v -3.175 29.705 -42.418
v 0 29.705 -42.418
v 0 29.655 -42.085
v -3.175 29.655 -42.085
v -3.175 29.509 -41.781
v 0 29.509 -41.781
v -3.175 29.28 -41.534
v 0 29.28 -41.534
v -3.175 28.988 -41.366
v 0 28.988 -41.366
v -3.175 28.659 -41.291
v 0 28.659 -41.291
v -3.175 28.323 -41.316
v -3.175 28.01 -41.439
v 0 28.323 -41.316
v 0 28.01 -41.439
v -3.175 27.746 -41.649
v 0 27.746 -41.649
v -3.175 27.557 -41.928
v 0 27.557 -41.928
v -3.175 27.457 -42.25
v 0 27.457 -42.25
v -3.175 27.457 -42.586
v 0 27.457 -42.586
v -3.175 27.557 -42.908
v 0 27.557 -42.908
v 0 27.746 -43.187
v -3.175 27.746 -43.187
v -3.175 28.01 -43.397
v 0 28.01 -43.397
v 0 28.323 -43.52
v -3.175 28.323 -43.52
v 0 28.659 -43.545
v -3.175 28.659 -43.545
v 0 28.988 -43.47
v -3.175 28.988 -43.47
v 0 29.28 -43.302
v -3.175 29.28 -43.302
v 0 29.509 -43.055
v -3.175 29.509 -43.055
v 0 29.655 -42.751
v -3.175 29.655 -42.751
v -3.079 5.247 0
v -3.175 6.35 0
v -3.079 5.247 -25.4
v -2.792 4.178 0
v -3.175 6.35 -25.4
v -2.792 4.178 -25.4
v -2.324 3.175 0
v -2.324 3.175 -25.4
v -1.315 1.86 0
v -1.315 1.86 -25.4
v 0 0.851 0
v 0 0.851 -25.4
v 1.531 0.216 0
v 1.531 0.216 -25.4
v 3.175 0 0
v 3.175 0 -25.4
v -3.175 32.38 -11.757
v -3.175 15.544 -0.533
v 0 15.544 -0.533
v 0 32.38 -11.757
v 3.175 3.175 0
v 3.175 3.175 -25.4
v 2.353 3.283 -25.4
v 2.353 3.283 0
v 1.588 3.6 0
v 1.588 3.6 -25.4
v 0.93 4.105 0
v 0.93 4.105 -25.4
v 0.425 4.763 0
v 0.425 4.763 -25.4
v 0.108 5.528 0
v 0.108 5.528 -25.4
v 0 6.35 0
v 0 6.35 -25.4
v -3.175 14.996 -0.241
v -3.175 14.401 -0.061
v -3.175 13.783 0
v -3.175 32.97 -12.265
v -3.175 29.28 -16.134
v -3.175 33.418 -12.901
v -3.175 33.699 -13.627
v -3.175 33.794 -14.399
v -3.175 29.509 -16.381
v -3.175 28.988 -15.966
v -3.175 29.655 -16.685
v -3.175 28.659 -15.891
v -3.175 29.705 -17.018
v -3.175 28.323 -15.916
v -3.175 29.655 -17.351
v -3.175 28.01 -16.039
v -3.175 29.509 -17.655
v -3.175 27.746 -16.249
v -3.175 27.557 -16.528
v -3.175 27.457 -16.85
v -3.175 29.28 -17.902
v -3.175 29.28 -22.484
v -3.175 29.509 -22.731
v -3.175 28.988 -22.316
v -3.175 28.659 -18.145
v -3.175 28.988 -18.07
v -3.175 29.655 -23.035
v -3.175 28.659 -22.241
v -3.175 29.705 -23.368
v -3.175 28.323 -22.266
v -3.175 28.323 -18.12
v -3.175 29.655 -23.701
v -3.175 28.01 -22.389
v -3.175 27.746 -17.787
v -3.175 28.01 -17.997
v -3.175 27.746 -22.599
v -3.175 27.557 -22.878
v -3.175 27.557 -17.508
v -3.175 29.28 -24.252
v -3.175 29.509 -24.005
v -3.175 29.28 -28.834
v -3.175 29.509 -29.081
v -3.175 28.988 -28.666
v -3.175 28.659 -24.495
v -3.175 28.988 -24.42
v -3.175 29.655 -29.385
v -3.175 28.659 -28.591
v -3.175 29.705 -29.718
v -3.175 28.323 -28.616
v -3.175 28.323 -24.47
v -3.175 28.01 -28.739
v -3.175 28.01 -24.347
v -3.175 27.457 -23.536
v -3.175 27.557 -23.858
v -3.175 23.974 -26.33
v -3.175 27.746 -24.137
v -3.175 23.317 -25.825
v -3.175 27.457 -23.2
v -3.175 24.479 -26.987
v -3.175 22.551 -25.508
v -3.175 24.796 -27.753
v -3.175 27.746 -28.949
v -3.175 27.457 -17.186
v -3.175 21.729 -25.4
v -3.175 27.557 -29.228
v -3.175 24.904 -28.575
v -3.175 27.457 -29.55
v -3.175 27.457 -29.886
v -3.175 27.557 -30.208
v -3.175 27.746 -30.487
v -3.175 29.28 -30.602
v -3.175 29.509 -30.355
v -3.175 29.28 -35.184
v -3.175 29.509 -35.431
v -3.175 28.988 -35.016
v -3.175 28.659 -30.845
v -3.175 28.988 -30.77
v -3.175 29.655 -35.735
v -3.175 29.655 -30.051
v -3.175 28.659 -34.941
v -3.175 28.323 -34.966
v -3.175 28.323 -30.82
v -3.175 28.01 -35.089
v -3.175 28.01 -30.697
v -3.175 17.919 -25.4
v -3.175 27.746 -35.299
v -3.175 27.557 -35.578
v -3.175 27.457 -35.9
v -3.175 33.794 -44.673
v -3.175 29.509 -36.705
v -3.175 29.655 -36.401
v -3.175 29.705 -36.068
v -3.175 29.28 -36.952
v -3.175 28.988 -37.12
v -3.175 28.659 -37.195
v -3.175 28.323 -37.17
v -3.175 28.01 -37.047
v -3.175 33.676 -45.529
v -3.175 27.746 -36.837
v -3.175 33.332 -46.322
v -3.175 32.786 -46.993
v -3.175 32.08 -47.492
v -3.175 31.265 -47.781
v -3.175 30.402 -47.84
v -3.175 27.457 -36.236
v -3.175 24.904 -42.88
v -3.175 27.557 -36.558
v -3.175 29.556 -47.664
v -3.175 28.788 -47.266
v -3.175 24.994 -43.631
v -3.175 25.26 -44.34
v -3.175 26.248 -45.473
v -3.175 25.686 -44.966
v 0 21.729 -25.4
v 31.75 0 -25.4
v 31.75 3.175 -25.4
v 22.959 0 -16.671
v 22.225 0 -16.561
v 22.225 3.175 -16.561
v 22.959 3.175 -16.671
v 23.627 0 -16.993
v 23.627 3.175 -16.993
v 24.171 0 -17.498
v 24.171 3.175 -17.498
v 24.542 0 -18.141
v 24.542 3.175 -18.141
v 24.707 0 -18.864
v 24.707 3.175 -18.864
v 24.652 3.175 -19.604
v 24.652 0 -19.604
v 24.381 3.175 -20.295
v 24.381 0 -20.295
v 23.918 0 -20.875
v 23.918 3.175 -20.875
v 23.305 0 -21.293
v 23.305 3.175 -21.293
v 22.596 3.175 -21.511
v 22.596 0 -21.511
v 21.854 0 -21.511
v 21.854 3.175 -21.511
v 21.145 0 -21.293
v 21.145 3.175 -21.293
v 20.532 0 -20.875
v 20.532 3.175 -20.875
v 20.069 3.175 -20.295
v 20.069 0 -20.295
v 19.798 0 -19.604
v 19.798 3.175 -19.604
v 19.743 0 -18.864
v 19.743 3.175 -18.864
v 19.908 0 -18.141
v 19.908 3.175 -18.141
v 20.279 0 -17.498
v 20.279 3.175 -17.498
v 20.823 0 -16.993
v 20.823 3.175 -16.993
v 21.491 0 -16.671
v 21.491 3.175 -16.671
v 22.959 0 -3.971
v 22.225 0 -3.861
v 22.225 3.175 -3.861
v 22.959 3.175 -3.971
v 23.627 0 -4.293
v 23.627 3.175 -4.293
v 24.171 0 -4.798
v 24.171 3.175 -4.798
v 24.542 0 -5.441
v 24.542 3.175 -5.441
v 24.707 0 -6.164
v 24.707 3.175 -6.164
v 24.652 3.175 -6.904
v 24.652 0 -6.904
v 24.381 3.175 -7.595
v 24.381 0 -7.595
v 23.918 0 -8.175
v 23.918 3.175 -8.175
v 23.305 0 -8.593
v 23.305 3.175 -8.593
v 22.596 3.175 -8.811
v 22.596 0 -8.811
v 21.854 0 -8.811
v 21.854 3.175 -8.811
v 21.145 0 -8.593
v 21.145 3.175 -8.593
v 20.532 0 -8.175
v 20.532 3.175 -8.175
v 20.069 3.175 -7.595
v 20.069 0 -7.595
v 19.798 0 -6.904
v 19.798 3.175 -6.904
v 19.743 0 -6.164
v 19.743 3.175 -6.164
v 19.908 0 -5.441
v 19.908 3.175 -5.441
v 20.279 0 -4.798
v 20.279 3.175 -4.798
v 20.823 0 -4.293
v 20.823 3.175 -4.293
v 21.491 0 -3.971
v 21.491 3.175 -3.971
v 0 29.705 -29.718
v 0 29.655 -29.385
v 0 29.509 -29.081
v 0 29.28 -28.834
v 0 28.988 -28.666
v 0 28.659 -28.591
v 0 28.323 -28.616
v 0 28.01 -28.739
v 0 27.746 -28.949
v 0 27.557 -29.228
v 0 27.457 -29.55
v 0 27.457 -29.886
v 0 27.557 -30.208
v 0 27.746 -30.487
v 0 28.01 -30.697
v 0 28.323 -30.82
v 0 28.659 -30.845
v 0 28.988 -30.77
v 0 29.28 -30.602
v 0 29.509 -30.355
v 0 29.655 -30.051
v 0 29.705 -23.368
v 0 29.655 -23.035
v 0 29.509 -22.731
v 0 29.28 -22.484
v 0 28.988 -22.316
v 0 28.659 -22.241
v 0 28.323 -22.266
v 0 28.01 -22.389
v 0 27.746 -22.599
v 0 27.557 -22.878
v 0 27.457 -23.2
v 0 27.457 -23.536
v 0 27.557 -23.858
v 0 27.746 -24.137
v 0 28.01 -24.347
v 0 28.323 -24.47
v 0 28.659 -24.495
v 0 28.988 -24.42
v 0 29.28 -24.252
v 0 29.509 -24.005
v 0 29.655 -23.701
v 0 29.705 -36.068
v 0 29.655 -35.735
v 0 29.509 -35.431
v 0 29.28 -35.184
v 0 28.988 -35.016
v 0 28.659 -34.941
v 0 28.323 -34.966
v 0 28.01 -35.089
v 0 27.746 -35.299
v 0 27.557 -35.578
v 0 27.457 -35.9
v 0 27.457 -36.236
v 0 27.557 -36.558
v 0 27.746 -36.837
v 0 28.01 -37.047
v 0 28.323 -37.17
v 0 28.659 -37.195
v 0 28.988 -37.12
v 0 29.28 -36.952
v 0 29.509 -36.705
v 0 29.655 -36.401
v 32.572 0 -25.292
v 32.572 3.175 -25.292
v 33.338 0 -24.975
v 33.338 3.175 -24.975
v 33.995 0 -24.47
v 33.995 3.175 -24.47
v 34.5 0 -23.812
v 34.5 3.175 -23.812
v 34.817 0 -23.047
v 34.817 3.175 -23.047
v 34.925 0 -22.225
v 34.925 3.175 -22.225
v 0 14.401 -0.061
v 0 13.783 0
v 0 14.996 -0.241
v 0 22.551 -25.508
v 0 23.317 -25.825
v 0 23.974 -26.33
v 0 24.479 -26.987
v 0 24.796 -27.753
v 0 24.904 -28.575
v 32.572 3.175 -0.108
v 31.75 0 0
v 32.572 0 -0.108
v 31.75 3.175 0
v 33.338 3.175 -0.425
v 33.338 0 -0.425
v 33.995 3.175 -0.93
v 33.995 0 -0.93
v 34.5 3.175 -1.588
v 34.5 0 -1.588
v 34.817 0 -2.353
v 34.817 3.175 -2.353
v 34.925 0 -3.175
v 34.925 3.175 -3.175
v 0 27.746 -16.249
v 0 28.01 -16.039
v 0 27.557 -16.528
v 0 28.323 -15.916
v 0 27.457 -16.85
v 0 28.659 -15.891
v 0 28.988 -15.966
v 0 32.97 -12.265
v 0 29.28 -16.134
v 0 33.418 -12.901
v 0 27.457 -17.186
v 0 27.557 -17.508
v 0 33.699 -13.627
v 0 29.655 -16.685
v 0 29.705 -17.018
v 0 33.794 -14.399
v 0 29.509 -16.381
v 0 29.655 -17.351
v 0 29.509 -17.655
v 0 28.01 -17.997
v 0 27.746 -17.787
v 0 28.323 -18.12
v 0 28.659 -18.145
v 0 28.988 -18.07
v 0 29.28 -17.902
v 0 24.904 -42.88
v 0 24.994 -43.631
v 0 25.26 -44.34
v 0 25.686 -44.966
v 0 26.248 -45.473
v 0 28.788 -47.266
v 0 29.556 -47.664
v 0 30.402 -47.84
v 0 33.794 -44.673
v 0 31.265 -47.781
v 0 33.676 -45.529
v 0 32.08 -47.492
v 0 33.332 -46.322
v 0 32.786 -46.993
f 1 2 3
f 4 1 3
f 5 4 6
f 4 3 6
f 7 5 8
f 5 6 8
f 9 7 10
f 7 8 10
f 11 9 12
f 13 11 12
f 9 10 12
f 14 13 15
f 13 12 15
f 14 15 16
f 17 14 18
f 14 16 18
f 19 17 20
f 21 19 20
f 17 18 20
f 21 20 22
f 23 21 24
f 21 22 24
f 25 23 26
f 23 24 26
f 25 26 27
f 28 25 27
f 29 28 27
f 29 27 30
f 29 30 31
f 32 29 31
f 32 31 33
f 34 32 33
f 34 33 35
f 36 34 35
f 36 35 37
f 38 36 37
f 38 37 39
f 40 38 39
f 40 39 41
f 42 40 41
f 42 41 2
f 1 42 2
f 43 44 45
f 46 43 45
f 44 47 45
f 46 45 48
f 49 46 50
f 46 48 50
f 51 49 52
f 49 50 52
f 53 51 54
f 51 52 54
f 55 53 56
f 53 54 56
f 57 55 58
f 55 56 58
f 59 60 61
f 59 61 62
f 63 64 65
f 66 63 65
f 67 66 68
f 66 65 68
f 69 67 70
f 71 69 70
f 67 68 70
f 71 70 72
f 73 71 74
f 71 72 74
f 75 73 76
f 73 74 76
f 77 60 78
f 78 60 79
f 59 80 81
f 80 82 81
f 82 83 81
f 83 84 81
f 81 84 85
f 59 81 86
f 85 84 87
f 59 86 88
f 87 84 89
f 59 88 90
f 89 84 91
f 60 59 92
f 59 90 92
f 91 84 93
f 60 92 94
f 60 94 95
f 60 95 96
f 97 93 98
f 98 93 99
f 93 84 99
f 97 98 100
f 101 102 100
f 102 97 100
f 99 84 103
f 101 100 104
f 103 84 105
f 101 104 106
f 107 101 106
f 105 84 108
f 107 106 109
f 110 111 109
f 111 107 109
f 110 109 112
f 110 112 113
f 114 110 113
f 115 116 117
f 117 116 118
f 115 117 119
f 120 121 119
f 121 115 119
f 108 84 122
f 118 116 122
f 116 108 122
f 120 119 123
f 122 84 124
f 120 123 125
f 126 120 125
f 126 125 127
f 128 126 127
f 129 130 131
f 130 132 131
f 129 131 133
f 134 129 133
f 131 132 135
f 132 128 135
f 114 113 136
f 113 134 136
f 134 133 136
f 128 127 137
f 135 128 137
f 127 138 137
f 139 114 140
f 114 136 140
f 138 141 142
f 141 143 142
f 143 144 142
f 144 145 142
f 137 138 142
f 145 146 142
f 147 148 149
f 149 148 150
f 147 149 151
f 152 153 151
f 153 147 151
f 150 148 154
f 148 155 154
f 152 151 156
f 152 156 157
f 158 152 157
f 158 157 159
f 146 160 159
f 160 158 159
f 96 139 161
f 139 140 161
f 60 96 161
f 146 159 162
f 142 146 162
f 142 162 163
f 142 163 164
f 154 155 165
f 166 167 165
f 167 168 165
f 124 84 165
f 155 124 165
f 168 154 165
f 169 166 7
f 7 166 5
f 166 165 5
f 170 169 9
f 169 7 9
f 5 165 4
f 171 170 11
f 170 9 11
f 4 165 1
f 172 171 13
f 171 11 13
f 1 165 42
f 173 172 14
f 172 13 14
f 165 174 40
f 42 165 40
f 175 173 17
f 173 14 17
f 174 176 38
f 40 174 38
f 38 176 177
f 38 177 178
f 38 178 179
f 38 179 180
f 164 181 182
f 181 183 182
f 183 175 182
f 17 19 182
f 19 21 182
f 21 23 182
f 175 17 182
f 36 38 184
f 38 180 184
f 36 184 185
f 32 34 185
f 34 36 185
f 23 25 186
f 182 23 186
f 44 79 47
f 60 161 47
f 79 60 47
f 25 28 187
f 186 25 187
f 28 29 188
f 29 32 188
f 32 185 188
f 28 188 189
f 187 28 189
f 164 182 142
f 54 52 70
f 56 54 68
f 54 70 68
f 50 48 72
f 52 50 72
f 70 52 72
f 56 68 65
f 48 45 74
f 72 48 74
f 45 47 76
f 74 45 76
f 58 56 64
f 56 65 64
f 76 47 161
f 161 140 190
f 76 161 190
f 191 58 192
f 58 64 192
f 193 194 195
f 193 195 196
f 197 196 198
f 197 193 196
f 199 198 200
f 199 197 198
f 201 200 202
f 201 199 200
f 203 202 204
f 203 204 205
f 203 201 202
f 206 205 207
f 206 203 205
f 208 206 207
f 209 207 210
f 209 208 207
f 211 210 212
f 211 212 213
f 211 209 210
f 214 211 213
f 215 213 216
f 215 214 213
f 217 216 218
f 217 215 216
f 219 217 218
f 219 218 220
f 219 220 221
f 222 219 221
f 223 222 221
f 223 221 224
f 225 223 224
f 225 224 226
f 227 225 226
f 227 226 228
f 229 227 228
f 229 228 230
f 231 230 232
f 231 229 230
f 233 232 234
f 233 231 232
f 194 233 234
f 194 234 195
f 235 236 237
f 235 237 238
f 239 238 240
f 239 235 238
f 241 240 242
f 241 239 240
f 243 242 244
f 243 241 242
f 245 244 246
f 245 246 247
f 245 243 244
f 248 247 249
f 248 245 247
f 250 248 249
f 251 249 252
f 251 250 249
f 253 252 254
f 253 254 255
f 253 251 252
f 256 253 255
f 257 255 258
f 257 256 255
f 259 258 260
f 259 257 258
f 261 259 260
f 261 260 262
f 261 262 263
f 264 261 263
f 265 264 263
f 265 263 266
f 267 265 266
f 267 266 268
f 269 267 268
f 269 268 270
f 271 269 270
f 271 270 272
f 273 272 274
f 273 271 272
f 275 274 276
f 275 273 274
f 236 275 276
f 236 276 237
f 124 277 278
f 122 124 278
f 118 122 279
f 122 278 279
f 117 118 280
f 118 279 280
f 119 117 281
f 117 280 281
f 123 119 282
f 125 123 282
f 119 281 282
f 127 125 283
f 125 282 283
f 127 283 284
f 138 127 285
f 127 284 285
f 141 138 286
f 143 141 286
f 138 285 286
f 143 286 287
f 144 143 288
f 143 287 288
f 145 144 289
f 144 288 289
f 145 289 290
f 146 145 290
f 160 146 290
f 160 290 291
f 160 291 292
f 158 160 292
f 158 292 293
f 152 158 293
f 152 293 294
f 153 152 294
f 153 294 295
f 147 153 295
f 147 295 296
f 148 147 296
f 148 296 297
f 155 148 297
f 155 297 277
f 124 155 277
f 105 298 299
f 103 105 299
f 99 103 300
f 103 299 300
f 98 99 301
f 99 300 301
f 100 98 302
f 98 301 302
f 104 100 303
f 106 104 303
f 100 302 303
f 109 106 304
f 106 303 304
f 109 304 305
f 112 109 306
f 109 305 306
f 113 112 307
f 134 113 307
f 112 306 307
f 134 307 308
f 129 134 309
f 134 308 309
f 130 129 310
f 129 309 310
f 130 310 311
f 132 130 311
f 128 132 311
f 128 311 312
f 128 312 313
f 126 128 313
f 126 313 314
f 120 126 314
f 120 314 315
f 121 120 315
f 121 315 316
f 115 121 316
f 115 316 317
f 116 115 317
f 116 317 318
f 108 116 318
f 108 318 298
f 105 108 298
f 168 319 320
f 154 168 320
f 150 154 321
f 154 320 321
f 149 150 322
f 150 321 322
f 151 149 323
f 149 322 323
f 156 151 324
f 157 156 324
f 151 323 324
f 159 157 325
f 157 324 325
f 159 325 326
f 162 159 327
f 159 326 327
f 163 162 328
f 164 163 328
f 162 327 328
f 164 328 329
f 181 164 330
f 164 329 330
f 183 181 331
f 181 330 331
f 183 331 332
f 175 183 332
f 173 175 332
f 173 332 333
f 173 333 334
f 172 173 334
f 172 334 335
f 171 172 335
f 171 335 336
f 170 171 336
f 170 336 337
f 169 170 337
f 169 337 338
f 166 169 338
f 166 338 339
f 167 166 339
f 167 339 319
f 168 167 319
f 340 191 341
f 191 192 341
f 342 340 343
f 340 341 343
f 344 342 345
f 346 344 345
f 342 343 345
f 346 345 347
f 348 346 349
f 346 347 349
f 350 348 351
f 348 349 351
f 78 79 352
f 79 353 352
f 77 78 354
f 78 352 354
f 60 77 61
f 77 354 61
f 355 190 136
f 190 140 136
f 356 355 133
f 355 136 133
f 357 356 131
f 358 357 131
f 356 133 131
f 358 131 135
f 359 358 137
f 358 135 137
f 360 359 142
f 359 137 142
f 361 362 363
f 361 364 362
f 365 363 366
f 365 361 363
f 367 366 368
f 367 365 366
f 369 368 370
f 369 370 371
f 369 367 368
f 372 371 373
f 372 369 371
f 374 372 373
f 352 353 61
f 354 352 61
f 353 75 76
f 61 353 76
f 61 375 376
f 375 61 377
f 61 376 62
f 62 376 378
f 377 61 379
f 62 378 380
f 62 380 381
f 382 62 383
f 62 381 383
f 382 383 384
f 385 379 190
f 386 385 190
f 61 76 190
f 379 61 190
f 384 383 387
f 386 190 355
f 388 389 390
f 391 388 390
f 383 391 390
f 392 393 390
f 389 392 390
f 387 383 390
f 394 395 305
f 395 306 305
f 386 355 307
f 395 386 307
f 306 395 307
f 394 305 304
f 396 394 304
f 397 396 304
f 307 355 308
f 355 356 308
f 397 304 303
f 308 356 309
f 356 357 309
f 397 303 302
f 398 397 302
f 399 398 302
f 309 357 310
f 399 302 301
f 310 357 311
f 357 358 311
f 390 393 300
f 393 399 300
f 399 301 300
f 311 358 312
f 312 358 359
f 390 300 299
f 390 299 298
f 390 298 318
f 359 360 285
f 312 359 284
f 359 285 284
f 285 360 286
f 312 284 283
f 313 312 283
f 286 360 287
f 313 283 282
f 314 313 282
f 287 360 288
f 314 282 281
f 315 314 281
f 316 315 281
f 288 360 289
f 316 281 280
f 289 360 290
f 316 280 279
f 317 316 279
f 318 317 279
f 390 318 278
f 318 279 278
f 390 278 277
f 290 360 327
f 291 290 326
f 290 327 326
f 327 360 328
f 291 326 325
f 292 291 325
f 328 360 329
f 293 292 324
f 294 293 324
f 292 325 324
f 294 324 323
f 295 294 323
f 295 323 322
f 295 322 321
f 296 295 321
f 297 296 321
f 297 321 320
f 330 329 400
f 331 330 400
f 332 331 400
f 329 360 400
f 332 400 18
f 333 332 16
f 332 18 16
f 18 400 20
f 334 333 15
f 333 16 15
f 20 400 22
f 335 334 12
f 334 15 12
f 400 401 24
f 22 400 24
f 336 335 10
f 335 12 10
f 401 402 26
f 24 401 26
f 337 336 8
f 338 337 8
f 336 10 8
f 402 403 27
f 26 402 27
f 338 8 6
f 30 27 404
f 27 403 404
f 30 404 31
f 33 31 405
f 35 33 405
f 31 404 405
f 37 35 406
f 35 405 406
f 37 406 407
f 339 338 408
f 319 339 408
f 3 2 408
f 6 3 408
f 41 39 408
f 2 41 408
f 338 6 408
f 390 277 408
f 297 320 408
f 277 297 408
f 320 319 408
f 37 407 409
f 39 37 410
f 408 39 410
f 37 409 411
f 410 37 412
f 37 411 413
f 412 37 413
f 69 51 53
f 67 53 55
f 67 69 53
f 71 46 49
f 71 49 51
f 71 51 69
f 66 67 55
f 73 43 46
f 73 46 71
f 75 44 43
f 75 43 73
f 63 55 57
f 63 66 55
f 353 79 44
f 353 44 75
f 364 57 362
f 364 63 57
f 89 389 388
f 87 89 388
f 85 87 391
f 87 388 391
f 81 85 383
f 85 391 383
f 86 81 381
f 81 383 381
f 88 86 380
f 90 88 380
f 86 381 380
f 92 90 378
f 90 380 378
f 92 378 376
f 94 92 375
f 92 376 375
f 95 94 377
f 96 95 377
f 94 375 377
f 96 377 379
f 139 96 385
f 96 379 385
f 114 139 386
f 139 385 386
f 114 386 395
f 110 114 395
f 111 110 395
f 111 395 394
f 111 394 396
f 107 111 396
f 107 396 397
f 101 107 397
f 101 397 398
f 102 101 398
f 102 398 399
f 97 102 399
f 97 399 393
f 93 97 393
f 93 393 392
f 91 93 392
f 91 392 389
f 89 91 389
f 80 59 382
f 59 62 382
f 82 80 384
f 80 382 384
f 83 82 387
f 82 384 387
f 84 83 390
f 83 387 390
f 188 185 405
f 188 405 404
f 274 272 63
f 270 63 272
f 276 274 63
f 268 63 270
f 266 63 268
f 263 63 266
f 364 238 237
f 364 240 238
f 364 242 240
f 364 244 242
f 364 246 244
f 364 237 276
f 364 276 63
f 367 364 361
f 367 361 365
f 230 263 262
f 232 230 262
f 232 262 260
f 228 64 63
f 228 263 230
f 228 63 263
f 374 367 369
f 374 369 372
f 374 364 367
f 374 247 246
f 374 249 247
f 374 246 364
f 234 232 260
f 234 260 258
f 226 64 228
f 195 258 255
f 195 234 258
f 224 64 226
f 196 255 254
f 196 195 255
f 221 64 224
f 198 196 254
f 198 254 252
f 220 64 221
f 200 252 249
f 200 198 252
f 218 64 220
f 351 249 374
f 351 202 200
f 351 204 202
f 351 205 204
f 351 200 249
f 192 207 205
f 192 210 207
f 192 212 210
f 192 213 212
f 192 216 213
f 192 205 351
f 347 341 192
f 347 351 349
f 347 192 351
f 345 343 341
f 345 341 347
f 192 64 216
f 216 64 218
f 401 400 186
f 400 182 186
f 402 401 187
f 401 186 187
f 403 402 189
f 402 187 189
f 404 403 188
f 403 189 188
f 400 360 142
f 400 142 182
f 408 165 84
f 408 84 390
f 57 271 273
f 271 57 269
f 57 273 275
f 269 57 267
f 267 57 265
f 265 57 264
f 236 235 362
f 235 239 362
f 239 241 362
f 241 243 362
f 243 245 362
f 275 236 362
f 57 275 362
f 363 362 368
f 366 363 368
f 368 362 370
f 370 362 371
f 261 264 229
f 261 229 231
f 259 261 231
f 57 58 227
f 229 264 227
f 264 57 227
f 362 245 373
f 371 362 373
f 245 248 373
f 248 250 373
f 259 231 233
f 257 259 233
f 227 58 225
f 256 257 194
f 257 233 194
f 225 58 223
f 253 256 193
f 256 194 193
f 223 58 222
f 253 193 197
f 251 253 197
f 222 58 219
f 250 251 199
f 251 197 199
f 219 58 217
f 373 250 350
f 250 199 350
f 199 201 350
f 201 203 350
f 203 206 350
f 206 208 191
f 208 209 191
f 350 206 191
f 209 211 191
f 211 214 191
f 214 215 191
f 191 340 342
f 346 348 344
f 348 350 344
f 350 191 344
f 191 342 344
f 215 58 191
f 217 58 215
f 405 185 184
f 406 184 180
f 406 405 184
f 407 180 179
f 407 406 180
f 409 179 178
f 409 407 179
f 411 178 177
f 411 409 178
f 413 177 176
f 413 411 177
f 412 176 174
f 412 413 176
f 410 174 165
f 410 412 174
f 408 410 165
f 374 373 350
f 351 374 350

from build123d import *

# Parameters (mm, degrees)
SKETCH1_R                  = 2.4892
BOSS_EXTRUDE1_DEPTH        = 3.175
SKETCHED_START             = -52
SKETCHED_BEND2_DEPTH       = 52
SKETCHED_START_2           = -25.4
SKETCHED_BEND2_2_DEPTH     = 12.7
SKETCHED_START_3           = -41.835294118
SKETCHED_BEND2_3_OUTLINE_W = 3.175
SKETCHED_BEND2_3_OUTLINE_H = 12.7
SKETCHED_BEND2_3_DEPTH     = 16.435294118
SKETCHED_BEND2_4_DEPTH     = 20.459192
SKETCHED_START_4           = -50.8
SKETCHED_BEND2_5_OUTLINE_W = 3.175
SKETCHED_BEND2_5_OUTLINE_H = 12.7
SKETCHED_BEND2_5_DEPTH     = 48.117252
SKETCHED_START_5           = -4.940808
SKETCHED_BEND2_6_DEPTH     = 4.940808
SKETCHED_START_6           = -3.175
SKETCHED_BEND2_7_DEPTH     = 3.175
SKETCH13_R                 = 1.1303
CUT_EXTRUDE2_DEPTH         = 71.302458254
FILLET1_R                  = 3.175
SKETCH14_W                 = 22.407113123
SKETCH14_H                 = 6.985
CUT_EXTRUDE3_DEPTH         = 69.199553227
FILLET2_R                  = 3.175


with BuildPart() as part:
    # Sketch1 → Boss-Extrude1 (new body)
    # profile 1 of 2: a face of its own
    with BuildSketch(Plane(origin=(0, 0, 0), x_dir=(1, 0, 0), z_dir=(0, 1, 0))):
        Polygon((6.35, 0), (25.4, 0), (34.925, 0), (34.925, 25.4), (26.986065751, 25.4), (10.476065751, 25.4), (6.35, 25.4), align=None)
        with Locations(Location((22.225, 6.35, 0), (0, 0, 270))):
            Circle(SKETCH1_R, mode=Mode.SUBTRACT)
        with Locations(Location((22.225, 19.05, 0), (0, 0, 270))):
            Circle(SKETCH1_R, mode=Mode.SUBTRACT)
    # profile 2 of 2: a face of its own
    with BuildSketch(Plane(origin=(0, 0, 0), x_dir=(1, 0, 0), z_dir=(0, 1, 0))):
        Polygon((-12.7, 0), (6.35, 0), (6.35, 25.4), (0, 25.4), (-19.05, 25.4), (-19.05, 41.835294118), (-23.415467049, 44.91680027), (-31.75, 50.8), (-31.75, 12.7), (-23.415467049, 7.143644699), align=None)
    extrude(amount=BOSS_EXTRUDE1_DEPTH)

    # Sketched Bend2: read off the stored shape, not the designer's step
    # Sketched Bend2 outline → Sketched Bend2 (cut)
    with BuildSketch(Plane.XY.offset(SKETCHED_START)):
        with BuildLine():
            ThreePointArc((3.175, 0), (-1e-09, 0.850738686), (-2.324261315, 3.175))
            Line((-2.324261315, 3.175), (-31.75, 3.175))
            Line((-31.75, 3.175), (-31.75, 0))
            Line((-31.75, 0), (3.175, 0))
        make_face()
    extrude(amount=SKETCHED_BEND2_DEPTH, mode=Mode.SUBTRACT)

    # Sketched Bend2 2 outline → Sketched Bend2 2 (add)
    with BuildSketch(Plane.XY.offset(SKETCHED_START_2)):
        with BuildLine():
            ThreePointArc((3.175, 3.175), (0.92993597, 4.10493597), (0, 6.35))
            Line((0, 6.35), (0, 33.794082494))
            Line((0, 33.794082494), (-3.175, 33.794082494))
            Line((-3.175, 33.794082494), (-3.175, 6.35))
            ThreePointArc((-3.175, 6.35), (-2.958628997, 4.706499064), (-2.324261315, 3.175))
            Line((-2.324261315, 3.175), (3.175, 3.175))
        make_face()
    extrude(amount=SKETCHED_BEND2_2_DEPTH)

    # Sketched Bend2 3 outline → Sketched Bend2 3 (add)
    with BuildSketch(Plane.XY.offset(SKETCHED_START_3)):
        with Locations((-1.5875, 27.444082494)):
            Rectangle(SKETCHED_BEND2_3_OUTLINE_W, SKETCHED_BEND2_3_OUTLINE_H)
    extrude(amount=SKETCHED_BEND2_3_DEPTH)

    # Sketched Bend2 4 outline → Sketched Bend2 4 (add)
    with BuildSketch(Plane.XY.offset(SKETCHED_START_2)):
        with BuildLine():
            ThreePointArc((3.175, 3.175), (0.92993597, 4.10493597), (0, 6.35))
            Line((0, 6.35), (0, 21.094082494))
            Line((0, 21.094082494), (-3.175, 21.094082494))
            Line((-3.175, 21.094082494), (-3.175, 6.35))
            ThreePointArc((-3.175, 6.35), (-2.958628997, 4.706499064), (-2.324261315, 3.175))
            Line((-2.324261315, 3.175), (3.175, 3.175))
        make_face()
    extrude(amount=SKETCHED_BEND2_4_DEPTH)

    # Sketched Bend2 5 outline → Sketched Bend2 5 (add)
    with BuildSketch(Plane.XY.offset(SKETCHED_START_4)):
        with Locations((-1.5875, 27.444082494)):
            Rectangle(SKETCHED_BEND2_5_OUTLINE_W, SKETCHED_BEND2_5_OUTLINE_H)
    extrude(amount=SKETCHED_BEND2_5_DEPTH)

    # Sketched Bend2 6 outline → Sketched Bend2 6 (add)
    with BuildSketch(Plane.XY.offset(SKETCHED_START_5)):
        with BuildLine():
            ThreePointArc((3.175, 3.175), (0.92993597, 4.10493597), (0, 6.35))
            Line((0, 6.35), (0, 21.094082494))
            Line((0, 21.094082494), (-3.175, 21.094082494))
            Line((-3.175, 21.094082494), (-3.175, 6.35))
            ThreePointArc((-3.175, 6.35), (-2.958628997, 4.706499064), (-2.324261315, 3.175))
            Line((-2.324261315, 3.175), (3.175, 3.175))
        make_face()
    extrude(amount=SKETCHED_BEND2_6_DEPTH)

    # Sketched Bend2 7 outline → Sketched Bend2 7 (cut)
    with BuildSketch(Plane.YZ.offset(SKETCHED_START_6)):
        Polygon((21.094082494, 0), (14.744082494, 0), (33.794082494, -12.7), (33.794082494, -2.682748), (21.094082494, -2.682748), align=None)
        Polygon((21.094082494, -50.8), (33.794082494, -50.8), (21.094082494, -41.835294118), align=None)
    extrude(amount=SKETCHED_BEND2_7_DEPTH, mode=Mode.SUBTRACT)

    # Sketch13 → Cut-Extrude2 (cut, through all)
    with BuildSketch(Plane(origin=(0, 0, 0), x_dir=(0, 0, -1), z_dir=(1, 0, 0))):
        with Locations(Location((42.418, 28.575, 0), (0, 0, 90))):
            Circle(SKETCH13_R)
        with Locations(Location((36.068, 28.575, 0), (0, 0, 90))):
            Circle(SKETCH13_R)
        with Locations(Location((29.718, 28.575, 0), (0, 0, 90))):
            Circle(SKETCH13_R)
        with Locations(Location((23.368, 28.575, 0), (0, 0, 90))):
            Circle(SKETCH13_R)
        with Locations(Location((17.018, 28.575, 0), (0, 0, 90))):
            Circle(SKETCH13_R)
    extrude(amount=-CUT_EXTRUDE2_DEPTH, mode=Mode.SUBTRACT)

    # Fillet1
    fillet1_edges = [part.edges().sort_by_distance(p)[0] for p in [
        (-1.5875, 21.094082494, -41.835294118),
        (-1.5875, 21.094082494, -25.4),
        (-1.5875, 14.744082494, 0),
        (-1.5875, 33.794082494, -12.7),
        (-1.5875, 33.794082494, -50.8),
        (34.925, 1.5875, -25.4),
        (34.925, 1.5875, 0),
    ]]
    fillet(fillet1_edges, radius=FILLET1_R)

    # Sketch14 → Cut-Extrude3 (cut, through all)
    with BuildSketch(Plane(origin=(0, 0, 0), x_dir=(0, 0, -1), z_dir=(1, 0, 0))):
        with Locations((36.603556561, 21.411582494)):
            Rectangle(SKETCH14_W, SKETCH14_H)
    extrude(amount=-CUT_EXTRUDE3_DEPTH, mode=Mode.SUBTRACT)

    # Fillet2
    fillet2_edges = [part.edges().sort_by_distance(p)[0] for p in [
        (-1.5875, 24.904082494, -44.524705882),
        (-1.5875, 24.904082494, -25.4),
    ]]
    fillet(fillet2_edges, radius=FILLET2_R)


solid = part.part
